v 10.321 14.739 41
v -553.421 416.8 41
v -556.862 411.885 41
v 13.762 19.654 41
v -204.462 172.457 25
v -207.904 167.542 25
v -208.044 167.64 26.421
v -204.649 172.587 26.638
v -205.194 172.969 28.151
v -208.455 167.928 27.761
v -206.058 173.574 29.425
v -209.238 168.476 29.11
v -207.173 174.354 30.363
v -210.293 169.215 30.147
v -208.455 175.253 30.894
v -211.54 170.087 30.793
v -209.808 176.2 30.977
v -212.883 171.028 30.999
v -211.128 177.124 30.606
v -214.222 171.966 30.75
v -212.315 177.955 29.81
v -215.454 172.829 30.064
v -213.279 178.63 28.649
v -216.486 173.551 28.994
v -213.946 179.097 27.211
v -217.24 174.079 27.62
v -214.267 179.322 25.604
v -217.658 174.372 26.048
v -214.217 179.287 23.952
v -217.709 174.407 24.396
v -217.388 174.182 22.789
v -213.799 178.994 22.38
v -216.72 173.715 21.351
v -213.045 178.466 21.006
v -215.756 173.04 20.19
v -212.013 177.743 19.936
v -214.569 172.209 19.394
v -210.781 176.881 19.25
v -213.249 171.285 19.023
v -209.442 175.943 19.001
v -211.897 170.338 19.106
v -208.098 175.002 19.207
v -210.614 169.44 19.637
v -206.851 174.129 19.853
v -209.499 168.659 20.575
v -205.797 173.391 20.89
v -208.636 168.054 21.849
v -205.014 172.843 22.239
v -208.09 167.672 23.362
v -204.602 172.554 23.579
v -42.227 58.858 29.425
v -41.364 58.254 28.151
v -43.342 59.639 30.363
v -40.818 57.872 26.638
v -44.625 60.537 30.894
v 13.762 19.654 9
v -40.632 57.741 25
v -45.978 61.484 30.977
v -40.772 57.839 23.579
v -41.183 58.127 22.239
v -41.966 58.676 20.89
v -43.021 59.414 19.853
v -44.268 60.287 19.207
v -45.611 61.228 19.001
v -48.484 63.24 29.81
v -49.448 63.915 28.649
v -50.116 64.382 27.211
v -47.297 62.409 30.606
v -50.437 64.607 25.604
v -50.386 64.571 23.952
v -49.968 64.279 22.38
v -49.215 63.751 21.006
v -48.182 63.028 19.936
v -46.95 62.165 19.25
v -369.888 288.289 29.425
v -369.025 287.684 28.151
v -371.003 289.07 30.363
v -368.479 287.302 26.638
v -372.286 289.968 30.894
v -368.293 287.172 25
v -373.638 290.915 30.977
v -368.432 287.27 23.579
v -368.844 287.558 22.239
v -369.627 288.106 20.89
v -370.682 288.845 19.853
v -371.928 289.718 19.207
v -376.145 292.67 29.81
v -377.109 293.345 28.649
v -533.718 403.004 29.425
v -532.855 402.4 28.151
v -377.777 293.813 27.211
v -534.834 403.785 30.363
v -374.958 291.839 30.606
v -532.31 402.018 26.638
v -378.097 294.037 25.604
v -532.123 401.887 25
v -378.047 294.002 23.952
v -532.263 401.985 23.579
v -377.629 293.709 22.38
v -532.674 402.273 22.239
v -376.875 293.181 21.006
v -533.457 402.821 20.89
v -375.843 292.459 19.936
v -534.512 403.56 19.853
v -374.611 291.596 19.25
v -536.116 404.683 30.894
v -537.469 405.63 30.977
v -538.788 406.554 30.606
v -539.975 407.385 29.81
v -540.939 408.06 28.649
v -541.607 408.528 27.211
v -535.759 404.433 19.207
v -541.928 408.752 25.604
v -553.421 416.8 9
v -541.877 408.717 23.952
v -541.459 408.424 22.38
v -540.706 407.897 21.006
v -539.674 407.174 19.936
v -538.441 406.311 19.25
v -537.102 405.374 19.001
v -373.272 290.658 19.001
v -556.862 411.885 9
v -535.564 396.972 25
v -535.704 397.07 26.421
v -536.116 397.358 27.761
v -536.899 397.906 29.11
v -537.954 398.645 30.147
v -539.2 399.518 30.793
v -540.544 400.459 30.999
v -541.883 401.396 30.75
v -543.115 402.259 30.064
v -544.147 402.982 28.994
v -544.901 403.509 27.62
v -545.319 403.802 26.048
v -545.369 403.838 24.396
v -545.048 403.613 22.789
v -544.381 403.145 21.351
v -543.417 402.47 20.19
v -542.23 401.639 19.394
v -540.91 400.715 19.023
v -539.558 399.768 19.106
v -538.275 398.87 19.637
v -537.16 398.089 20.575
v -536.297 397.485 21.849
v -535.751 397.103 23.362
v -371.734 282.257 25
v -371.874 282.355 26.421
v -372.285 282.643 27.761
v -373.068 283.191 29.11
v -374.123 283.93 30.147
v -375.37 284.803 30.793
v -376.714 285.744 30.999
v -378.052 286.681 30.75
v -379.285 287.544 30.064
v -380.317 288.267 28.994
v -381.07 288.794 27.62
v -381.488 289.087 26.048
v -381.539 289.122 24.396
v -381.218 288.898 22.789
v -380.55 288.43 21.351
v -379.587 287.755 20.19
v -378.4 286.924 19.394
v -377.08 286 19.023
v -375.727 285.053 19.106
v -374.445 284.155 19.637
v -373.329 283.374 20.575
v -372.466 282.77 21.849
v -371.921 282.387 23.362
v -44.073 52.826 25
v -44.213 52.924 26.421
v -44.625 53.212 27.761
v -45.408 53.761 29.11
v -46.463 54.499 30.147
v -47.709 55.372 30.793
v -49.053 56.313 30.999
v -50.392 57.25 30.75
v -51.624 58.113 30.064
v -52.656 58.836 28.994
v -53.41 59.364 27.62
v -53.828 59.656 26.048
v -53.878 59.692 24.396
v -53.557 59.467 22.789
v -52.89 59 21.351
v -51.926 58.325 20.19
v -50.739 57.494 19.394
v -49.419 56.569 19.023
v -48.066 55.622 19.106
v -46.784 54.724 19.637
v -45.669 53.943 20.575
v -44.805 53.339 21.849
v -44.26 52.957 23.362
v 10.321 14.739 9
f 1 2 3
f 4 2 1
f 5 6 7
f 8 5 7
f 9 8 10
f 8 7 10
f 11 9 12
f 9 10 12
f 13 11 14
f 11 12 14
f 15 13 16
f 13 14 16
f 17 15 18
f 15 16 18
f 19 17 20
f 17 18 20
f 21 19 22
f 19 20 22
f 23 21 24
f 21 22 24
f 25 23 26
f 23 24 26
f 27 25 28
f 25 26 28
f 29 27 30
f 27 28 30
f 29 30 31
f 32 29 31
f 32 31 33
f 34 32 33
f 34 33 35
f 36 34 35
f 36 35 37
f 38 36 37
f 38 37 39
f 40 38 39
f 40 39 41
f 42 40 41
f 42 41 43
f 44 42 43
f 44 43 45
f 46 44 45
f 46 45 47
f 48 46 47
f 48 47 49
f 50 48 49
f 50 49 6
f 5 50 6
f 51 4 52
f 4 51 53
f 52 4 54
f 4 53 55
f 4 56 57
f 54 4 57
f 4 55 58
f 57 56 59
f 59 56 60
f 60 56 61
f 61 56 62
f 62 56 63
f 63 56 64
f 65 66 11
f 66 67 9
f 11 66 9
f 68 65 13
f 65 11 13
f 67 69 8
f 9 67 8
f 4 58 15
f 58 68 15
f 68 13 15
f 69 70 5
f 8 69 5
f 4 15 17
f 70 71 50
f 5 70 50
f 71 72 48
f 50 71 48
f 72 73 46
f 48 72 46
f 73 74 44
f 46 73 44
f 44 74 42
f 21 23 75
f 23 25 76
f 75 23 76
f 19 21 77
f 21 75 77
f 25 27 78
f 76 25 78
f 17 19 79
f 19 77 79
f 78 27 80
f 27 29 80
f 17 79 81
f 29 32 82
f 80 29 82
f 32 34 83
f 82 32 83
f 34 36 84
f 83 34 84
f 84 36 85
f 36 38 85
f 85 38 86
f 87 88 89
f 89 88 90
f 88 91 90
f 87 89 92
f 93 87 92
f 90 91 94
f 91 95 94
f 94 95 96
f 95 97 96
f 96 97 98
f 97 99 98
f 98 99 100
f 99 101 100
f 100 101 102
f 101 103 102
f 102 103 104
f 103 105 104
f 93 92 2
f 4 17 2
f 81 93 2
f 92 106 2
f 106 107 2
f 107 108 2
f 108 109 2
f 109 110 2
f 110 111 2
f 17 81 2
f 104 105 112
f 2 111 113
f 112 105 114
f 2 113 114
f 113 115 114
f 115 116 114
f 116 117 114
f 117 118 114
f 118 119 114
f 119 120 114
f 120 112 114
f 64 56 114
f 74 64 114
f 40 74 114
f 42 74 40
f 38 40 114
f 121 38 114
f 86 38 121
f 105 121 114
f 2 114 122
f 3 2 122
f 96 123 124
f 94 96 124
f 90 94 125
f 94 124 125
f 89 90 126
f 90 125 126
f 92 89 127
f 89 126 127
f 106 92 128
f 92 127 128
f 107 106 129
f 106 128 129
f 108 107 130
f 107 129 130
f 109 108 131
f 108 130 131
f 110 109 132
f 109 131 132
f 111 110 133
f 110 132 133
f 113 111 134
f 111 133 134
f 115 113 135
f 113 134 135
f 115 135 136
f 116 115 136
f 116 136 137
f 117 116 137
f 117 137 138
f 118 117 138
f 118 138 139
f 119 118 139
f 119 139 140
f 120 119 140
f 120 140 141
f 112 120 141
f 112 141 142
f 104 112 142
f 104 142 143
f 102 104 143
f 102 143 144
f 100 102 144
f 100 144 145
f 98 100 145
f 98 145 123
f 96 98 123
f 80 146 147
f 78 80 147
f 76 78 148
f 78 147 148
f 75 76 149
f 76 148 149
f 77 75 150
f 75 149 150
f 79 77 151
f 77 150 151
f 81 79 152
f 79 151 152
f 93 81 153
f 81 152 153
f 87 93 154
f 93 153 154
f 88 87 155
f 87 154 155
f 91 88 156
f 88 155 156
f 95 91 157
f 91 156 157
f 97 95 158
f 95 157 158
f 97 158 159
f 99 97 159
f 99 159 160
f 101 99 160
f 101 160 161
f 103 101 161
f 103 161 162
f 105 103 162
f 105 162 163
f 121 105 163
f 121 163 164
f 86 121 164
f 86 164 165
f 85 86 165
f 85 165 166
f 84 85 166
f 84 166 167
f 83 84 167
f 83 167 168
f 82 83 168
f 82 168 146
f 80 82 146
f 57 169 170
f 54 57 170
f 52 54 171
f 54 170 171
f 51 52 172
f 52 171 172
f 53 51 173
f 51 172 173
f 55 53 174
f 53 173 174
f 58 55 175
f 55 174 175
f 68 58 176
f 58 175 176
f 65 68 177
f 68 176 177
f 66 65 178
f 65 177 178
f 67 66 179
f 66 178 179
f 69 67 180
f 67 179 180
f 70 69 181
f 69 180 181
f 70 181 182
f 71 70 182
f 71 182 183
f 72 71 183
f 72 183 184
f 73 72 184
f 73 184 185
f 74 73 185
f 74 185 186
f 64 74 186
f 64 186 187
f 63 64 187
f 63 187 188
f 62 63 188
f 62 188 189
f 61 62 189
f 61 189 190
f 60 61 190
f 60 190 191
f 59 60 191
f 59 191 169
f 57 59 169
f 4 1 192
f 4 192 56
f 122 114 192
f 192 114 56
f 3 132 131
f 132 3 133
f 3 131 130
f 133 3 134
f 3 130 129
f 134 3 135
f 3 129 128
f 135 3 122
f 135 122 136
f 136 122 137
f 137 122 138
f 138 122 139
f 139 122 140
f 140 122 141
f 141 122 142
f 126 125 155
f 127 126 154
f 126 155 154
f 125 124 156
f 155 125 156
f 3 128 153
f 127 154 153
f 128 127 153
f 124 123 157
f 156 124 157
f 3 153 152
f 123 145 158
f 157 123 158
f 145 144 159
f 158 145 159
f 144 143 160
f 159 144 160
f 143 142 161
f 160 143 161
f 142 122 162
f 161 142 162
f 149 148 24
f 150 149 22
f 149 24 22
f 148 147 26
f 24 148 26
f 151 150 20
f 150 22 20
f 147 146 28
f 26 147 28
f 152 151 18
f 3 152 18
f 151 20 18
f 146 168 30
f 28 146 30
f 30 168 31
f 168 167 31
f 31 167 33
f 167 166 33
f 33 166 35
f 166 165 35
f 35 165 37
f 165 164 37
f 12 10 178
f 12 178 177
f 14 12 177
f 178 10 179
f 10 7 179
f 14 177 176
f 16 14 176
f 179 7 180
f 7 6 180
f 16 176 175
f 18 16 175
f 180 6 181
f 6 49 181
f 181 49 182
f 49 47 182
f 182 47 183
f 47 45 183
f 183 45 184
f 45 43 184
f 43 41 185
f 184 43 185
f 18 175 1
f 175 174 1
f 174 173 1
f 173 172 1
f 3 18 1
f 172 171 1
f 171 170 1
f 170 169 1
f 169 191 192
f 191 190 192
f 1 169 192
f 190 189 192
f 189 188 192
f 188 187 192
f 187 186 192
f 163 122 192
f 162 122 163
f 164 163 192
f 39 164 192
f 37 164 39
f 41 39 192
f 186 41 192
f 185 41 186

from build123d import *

# Parameters (mm, degrees)
PAD011_DEPTH           = 32
SKETCH048_R            = 6
POCKET006_DEPTH        = 331.323772
LINEARPATTERN004_COUNT = 4
LINEARPATTERN004_PITCH = 200


with BuildPart() as part:
    # Sketch047 → Pad011 (new body)
    with BuildSketch(Plane.XY):
        Polygon((-556.862366, 411.885088), (10.320579, 14.739314), (13.762038, 19.654226), (-553.420907, 416.8), align=None)
    extrude(amount=PAD011_DEPTH)

    # Sketch048 (on Face1 of Pad011) → Pocket006 (cut, through all)
    with BuildSketch(Plane(origin=(10.320579, 14.739314, 0), x_dir=(0.819152, -0.573576, 0), z_dir=(-0.573576, -0.819152, 0))):
        with Locations((-672.402526, 16)):
            Circle(SKETCH048_R)
    pocket006 = extrude(amount=-POCKET006_DEPTH, mode=Mode.SUBTRACT)

    # LinearPattern004: Pocket006 ×4
    with Locations(*[Vector(0.819152, -0.573576, 0) * (i * LINEARPATTERN004_PITCH) for i in range(1, LINEARPATTERN004_COUNT)]):
        add(pocket006, mode=Mode.SUBTRACT)


with BuildPart() as part_1:
    # Body008 placement: moved
    add(part.part.moved(Location((0, 0, 9))))


solid = part_1.part
